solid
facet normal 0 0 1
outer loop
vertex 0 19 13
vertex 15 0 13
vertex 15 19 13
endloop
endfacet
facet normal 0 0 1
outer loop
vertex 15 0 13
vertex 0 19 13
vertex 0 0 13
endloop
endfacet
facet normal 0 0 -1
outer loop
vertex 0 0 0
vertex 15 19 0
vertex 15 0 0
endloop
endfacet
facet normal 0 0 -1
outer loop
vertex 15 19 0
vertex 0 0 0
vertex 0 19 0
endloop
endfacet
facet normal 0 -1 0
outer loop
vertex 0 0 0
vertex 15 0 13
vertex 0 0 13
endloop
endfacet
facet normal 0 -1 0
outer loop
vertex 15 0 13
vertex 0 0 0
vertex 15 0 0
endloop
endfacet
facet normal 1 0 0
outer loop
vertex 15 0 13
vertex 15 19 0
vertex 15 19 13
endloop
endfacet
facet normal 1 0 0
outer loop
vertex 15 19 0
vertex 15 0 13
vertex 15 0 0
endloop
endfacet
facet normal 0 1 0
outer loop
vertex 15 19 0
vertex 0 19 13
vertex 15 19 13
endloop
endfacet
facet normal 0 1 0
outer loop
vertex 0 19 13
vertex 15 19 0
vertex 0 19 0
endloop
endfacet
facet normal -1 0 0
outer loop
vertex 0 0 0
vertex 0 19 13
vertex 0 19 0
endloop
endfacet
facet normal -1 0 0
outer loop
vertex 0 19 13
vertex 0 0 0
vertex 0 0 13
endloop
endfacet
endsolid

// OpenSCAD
// Generated by SolidPython 1.0.1 on 2020-07-29 00:46:56


cube(size = [15, 19, 13]);
/***********************************************
*********      SolidPython code:      **********
************************************************
 
# import packages: SolidPython
from solid import *
from solid.utils import *
from itertools import chain, combinations, permutations


class Resize:

    def __init__(self, scad_file):
        self.scad_file = scad_file
        #self.scad_file = import_scad(scad_file)
        # cone/cylinder param:
        self.r1 = 0
        self.r2 = 0
        self.h = 0
        # rectangular prism param:
        self.w = 0
        self.l = 0
        # ellipse param:
        self.r = 0

    # import OpenScad code (file name corresponds to shape)


    # classify shape + parameters
    def assign(self, param1, param2, param3):
        if self.scad_file == 'cone.scad':
            self.r1 = param1
            self.r2 = param2
            self.h = param3
        elif self.scad_file == 'cylinder.scad':
            self.r1 = param1
            self.r2 = param2
            self.h = param3
        elif self.scad_file == 'rectangularPrism.scad':
            self.h = param1
            self.l = param2
            self.w = param3
        else:
            self.r = param1
            self.h = param2

    # resize parameters
    def iterate(self):
        x = range(3, 20, 2)
        i = 1
        if self.scad_file == 'cone.scad':
            tempList = list(permutations(x, 2))
            for temp in tempList:
                param1 = temp[0]
                param2 = temp[1]
                filepath = 'produced_scad_files/' + 'cone' + str(param1) + '_' + str(param2) + '_' + '.scad'
                scad_render_to_file(cylinder(h=param1, r1=param2, r2=0), filepath)

        elif self.scad_file == 'cylinder.scad':
            tempList = list(permutations(x, 3))
            for temp in tempList:
                param1 = temp[0]
                param2 = temp[1]
                filepath = 'produced_scad_files/' + 'cylinder' + str(param1) + '_' + str(param2) + '_' + '.scad'
                scad_render_to_file(cylinder(h=param1, r1=param2, r2=param2), filepath)

        elif self.scad_file == 'rectangularPrism.scad':
            tempList = list(permutations(x, 3))
            for temp in tempList:
                param1 = temp[0]
                param2 = temp[1]
                param3 = temp[2]
                filepath = 'produced_scad_files/' + 'rectangularPrism' + str(param1) + '_' + str(param2) + '_' + str(
                    param3) + '.scad'
                scad_render_to_file(cube(size=(param1, param2, param3)), filepath)

        elif self.scad_file == 'ellipse.scad':
            tempList = list(permutations(x, 4))
            for temp in tempList:
                param1 = temp[0]
                param2 = temp[1]
                param3 = temp[2]
                param4 = temp[3]
                filepath = 'produced_scad_files/' + 'ellipse' + str(param1) + '_' + str(param2) + '_' + str(param3) + '_' + str(param4) + '.scad'
                scad_render_to_file(scale([param1, param2, param3])(sphere(r=param4)), filepath)

    def render_to_scadfile(self):
        scad_render_to_file(scad, 'example.scad') 
 
************************************************/
